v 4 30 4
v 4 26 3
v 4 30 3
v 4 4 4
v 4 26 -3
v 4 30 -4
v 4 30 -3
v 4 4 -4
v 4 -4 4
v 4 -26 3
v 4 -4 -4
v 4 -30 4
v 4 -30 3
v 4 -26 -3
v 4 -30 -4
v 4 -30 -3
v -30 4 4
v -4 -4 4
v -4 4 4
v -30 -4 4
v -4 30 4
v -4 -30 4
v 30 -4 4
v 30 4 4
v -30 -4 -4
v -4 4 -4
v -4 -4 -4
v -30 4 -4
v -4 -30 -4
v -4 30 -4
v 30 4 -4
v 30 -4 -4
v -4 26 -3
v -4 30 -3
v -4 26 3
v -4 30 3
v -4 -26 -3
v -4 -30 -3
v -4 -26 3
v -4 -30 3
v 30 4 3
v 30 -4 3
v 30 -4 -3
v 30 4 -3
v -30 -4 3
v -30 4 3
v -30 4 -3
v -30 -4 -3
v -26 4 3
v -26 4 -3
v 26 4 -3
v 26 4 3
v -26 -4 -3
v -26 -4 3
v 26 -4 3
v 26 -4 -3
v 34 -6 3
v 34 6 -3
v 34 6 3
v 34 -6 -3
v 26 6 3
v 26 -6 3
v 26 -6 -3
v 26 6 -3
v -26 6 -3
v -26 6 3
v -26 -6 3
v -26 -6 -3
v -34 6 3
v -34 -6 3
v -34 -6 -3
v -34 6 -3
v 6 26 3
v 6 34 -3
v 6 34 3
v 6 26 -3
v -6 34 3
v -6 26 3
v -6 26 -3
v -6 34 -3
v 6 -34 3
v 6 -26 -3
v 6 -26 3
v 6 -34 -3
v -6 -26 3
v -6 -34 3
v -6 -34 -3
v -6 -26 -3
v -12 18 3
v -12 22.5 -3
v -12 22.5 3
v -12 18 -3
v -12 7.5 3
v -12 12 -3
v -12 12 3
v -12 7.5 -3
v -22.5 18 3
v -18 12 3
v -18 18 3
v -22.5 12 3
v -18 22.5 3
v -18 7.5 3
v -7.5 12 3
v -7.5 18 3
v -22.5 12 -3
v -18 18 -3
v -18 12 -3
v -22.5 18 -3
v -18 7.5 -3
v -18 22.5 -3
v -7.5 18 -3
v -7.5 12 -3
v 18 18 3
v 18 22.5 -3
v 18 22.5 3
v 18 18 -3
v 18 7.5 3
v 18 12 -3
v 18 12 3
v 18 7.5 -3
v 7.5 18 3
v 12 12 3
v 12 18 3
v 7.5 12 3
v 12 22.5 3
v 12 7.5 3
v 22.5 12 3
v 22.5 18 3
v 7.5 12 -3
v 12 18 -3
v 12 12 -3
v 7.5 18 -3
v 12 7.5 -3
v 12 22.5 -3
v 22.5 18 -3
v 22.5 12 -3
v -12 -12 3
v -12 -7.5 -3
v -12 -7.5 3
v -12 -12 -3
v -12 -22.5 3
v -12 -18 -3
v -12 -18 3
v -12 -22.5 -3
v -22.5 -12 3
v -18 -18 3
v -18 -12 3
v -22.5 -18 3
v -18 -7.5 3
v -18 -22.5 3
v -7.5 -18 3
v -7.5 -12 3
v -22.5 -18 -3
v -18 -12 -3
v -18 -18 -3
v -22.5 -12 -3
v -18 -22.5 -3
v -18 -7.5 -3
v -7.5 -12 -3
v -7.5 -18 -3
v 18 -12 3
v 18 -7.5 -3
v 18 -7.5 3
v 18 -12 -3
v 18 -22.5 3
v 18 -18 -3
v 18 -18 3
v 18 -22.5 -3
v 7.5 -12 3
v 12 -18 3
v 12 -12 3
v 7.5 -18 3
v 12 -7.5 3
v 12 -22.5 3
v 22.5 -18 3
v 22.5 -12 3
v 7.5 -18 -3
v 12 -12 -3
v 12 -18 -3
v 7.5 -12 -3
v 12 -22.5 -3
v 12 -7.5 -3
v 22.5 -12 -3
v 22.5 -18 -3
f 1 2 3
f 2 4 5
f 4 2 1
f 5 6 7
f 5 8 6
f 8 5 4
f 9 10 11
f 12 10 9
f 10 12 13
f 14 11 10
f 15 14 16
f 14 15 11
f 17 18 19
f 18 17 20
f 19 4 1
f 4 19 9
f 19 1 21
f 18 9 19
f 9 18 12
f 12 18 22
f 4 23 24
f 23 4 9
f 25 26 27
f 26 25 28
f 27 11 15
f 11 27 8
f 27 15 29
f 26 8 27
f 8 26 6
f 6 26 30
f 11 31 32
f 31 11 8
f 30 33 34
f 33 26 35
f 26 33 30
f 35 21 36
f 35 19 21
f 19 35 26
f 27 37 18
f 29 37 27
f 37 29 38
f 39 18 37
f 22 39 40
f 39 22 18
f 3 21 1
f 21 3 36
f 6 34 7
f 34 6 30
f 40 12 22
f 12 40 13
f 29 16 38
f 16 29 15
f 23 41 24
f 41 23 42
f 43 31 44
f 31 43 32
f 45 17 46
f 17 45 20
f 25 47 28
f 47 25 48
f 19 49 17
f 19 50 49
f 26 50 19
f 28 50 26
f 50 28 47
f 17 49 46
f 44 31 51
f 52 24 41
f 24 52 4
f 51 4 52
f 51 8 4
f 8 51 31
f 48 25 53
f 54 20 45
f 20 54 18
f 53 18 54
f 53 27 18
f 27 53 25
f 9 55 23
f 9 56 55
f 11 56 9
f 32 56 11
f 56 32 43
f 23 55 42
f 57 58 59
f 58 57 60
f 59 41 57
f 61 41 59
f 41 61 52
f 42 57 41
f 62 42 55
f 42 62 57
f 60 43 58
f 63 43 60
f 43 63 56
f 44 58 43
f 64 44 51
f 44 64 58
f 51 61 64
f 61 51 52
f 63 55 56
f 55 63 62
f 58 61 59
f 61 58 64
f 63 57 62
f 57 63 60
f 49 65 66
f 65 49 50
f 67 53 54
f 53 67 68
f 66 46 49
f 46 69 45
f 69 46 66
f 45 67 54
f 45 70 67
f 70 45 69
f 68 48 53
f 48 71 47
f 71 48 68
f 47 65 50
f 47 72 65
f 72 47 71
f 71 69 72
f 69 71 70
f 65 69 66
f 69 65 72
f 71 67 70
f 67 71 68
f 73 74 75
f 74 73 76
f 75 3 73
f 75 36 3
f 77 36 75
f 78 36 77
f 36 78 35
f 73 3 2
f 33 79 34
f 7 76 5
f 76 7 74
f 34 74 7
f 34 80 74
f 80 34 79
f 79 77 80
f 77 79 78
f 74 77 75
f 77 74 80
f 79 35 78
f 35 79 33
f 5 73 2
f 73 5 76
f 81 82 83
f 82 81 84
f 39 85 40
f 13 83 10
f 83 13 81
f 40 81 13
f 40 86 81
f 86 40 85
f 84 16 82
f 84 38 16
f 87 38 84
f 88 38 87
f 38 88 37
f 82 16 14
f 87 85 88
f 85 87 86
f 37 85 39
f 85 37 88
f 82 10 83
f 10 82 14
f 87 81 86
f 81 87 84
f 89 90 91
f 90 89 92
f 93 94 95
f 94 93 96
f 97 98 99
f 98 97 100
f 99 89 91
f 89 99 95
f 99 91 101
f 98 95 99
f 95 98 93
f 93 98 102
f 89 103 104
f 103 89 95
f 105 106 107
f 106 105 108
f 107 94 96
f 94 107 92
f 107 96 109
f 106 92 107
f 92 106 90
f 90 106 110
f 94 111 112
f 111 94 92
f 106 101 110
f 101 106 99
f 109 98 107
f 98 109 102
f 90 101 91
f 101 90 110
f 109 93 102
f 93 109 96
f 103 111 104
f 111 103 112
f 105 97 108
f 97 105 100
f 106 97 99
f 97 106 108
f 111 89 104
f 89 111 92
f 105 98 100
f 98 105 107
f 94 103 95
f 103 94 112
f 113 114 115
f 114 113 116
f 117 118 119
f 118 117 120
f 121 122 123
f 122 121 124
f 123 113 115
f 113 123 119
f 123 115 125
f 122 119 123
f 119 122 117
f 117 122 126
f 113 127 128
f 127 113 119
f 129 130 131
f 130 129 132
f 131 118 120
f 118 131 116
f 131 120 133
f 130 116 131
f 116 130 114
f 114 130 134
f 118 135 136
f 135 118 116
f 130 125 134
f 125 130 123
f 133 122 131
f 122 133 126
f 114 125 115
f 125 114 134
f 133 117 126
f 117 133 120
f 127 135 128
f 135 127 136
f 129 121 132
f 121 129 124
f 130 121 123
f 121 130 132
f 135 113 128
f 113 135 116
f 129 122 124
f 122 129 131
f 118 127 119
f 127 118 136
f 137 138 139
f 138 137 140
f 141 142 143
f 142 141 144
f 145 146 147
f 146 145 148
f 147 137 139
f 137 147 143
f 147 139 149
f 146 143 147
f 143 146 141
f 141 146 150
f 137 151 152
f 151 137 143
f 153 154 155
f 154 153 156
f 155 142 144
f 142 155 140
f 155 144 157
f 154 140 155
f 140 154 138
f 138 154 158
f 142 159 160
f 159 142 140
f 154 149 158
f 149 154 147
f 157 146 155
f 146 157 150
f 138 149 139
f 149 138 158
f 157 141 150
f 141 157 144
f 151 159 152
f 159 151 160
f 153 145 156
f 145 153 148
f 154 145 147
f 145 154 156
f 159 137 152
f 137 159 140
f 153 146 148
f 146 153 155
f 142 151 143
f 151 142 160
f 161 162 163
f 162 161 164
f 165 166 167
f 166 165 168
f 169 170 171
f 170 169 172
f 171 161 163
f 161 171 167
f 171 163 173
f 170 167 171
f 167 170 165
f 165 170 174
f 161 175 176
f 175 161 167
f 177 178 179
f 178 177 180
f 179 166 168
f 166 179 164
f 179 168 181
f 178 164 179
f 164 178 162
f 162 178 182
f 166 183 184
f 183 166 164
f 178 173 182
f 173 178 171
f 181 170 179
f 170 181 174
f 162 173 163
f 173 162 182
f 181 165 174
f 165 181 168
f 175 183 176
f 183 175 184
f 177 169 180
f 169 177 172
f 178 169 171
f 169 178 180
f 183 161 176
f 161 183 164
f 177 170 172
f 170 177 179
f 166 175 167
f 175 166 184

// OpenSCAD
// Jerusalem's Cross (Crusader's Cross) in OpenSCAD
// This design features a large central cross with four smaller crosses

// Parameters
main_cross_width = 60;
main_cross_height = 60;
main_cross_thickness = 8;
small_cross_size = 15;
small_cross_thickness = 6;
serif_length = 12;
serif_thickness = 6;

// Module to create a cross with serifs (terminals)
module create_cross_with_serifs(width, height, thickness) {
    union() {
        // Vertical bar
        cube([thickness, height, thickness], center=true);
        // Horizontal bar
        cube([width, thickness, thickness], center=true);
        
        // Serifs on horizontal arms
        translate([width/2, 0, 0])
            cube([thickness, serif_length, serif_thickness], center=true);
        translate([-width/2, 0, 0])
            cube([thickness, serif_length, serif_thickness], center=true);
        
        // Serifs on vertical arms
        translate([0, height/2, 0])
            cube([serif_length, thickness, serif_thickness], center=true);
        translate([0, -height/2, 0])
            cube([serif_length, thickness, serif_thickness], center=true);
    }
}

// Module to create a simple cross (for small crosses)
module create_cross(width, height, thickness) {
    union() {
        // Vertical bar
        cube([thickness, height, thickness], center=true);
        // Horizontal bar
        cube([width, thickness, thickness], center=true);
    }
}

// Jerusalem's Cross without base
module jerusalems_cross() {
    union() {
        // Main large cross with serifs
        create_cross_with_serifs(main_cross_width, main_cross_height, main_cross_thickness);
        
        // Four small crosses in quadrants
        translate([-main_cross_width/4, main_cross_height/4, 0])
            create_cross(small_cross_size, small_cross_size, small_cross_thickness);
        
        translate([main_cross_width/4, main_cross_height/4, 0])
            create_cross(small_cross_size, small_cross_size, small_cross_thickness);
        
        translate([-main_cross_width/4, -main_cross_height/4, 0])
            create_cross(small_cross_size, small_cross_size, small_cross_thickness);
        
        translate([main_cross_width/4, -main_cross_height/4, 0])
            create_cross(small_cross_size, small_cross_size, small_cross_thickness);
    }
}

// Render the Jerusalem's Cross
jerusalems_cross();
